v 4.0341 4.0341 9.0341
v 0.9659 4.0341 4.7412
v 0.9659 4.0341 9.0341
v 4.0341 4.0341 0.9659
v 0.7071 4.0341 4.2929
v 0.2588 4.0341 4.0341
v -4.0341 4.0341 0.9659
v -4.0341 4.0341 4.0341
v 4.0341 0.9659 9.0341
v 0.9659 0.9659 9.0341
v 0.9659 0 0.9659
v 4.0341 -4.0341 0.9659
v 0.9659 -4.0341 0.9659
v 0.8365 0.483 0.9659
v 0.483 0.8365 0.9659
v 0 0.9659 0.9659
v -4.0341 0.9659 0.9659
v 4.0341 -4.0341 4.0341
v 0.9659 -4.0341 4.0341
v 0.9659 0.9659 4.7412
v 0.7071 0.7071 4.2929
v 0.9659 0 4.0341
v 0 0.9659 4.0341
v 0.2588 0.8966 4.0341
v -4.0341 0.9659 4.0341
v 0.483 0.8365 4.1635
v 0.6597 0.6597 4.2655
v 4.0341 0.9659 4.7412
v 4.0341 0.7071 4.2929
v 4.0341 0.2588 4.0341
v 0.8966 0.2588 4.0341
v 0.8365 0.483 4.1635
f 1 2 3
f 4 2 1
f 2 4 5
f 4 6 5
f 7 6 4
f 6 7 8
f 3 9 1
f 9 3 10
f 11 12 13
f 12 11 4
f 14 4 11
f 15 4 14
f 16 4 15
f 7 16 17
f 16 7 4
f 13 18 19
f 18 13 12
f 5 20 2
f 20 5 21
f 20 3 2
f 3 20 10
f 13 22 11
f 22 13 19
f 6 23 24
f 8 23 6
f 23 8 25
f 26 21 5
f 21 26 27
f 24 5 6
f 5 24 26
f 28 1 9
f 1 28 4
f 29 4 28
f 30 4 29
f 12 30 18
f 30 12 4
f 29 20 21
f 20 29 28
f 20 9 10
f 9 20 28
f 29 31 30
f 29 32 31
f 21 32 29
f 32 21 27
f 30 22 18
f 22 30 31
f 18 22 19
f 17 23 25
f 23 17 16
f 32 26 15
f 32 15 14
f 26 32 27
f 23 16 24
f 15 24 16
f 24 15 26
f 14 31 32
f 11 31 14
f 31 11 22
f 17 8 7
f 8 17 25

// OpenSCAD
module erode(r) {
    difference() {
        children();
        minkowski(convexity=3) {
            difference() {
                cube(25, center=true);
                children();
            }
            sphere(r);
        }
    }
}

module object() {
    translate([-5,0,0]) cube([10,5,5]);
    translate([0,-5,0]) cube([5,10,5]);
    cube([5,5,10]);
}

erode(1,$fn=12) object();
